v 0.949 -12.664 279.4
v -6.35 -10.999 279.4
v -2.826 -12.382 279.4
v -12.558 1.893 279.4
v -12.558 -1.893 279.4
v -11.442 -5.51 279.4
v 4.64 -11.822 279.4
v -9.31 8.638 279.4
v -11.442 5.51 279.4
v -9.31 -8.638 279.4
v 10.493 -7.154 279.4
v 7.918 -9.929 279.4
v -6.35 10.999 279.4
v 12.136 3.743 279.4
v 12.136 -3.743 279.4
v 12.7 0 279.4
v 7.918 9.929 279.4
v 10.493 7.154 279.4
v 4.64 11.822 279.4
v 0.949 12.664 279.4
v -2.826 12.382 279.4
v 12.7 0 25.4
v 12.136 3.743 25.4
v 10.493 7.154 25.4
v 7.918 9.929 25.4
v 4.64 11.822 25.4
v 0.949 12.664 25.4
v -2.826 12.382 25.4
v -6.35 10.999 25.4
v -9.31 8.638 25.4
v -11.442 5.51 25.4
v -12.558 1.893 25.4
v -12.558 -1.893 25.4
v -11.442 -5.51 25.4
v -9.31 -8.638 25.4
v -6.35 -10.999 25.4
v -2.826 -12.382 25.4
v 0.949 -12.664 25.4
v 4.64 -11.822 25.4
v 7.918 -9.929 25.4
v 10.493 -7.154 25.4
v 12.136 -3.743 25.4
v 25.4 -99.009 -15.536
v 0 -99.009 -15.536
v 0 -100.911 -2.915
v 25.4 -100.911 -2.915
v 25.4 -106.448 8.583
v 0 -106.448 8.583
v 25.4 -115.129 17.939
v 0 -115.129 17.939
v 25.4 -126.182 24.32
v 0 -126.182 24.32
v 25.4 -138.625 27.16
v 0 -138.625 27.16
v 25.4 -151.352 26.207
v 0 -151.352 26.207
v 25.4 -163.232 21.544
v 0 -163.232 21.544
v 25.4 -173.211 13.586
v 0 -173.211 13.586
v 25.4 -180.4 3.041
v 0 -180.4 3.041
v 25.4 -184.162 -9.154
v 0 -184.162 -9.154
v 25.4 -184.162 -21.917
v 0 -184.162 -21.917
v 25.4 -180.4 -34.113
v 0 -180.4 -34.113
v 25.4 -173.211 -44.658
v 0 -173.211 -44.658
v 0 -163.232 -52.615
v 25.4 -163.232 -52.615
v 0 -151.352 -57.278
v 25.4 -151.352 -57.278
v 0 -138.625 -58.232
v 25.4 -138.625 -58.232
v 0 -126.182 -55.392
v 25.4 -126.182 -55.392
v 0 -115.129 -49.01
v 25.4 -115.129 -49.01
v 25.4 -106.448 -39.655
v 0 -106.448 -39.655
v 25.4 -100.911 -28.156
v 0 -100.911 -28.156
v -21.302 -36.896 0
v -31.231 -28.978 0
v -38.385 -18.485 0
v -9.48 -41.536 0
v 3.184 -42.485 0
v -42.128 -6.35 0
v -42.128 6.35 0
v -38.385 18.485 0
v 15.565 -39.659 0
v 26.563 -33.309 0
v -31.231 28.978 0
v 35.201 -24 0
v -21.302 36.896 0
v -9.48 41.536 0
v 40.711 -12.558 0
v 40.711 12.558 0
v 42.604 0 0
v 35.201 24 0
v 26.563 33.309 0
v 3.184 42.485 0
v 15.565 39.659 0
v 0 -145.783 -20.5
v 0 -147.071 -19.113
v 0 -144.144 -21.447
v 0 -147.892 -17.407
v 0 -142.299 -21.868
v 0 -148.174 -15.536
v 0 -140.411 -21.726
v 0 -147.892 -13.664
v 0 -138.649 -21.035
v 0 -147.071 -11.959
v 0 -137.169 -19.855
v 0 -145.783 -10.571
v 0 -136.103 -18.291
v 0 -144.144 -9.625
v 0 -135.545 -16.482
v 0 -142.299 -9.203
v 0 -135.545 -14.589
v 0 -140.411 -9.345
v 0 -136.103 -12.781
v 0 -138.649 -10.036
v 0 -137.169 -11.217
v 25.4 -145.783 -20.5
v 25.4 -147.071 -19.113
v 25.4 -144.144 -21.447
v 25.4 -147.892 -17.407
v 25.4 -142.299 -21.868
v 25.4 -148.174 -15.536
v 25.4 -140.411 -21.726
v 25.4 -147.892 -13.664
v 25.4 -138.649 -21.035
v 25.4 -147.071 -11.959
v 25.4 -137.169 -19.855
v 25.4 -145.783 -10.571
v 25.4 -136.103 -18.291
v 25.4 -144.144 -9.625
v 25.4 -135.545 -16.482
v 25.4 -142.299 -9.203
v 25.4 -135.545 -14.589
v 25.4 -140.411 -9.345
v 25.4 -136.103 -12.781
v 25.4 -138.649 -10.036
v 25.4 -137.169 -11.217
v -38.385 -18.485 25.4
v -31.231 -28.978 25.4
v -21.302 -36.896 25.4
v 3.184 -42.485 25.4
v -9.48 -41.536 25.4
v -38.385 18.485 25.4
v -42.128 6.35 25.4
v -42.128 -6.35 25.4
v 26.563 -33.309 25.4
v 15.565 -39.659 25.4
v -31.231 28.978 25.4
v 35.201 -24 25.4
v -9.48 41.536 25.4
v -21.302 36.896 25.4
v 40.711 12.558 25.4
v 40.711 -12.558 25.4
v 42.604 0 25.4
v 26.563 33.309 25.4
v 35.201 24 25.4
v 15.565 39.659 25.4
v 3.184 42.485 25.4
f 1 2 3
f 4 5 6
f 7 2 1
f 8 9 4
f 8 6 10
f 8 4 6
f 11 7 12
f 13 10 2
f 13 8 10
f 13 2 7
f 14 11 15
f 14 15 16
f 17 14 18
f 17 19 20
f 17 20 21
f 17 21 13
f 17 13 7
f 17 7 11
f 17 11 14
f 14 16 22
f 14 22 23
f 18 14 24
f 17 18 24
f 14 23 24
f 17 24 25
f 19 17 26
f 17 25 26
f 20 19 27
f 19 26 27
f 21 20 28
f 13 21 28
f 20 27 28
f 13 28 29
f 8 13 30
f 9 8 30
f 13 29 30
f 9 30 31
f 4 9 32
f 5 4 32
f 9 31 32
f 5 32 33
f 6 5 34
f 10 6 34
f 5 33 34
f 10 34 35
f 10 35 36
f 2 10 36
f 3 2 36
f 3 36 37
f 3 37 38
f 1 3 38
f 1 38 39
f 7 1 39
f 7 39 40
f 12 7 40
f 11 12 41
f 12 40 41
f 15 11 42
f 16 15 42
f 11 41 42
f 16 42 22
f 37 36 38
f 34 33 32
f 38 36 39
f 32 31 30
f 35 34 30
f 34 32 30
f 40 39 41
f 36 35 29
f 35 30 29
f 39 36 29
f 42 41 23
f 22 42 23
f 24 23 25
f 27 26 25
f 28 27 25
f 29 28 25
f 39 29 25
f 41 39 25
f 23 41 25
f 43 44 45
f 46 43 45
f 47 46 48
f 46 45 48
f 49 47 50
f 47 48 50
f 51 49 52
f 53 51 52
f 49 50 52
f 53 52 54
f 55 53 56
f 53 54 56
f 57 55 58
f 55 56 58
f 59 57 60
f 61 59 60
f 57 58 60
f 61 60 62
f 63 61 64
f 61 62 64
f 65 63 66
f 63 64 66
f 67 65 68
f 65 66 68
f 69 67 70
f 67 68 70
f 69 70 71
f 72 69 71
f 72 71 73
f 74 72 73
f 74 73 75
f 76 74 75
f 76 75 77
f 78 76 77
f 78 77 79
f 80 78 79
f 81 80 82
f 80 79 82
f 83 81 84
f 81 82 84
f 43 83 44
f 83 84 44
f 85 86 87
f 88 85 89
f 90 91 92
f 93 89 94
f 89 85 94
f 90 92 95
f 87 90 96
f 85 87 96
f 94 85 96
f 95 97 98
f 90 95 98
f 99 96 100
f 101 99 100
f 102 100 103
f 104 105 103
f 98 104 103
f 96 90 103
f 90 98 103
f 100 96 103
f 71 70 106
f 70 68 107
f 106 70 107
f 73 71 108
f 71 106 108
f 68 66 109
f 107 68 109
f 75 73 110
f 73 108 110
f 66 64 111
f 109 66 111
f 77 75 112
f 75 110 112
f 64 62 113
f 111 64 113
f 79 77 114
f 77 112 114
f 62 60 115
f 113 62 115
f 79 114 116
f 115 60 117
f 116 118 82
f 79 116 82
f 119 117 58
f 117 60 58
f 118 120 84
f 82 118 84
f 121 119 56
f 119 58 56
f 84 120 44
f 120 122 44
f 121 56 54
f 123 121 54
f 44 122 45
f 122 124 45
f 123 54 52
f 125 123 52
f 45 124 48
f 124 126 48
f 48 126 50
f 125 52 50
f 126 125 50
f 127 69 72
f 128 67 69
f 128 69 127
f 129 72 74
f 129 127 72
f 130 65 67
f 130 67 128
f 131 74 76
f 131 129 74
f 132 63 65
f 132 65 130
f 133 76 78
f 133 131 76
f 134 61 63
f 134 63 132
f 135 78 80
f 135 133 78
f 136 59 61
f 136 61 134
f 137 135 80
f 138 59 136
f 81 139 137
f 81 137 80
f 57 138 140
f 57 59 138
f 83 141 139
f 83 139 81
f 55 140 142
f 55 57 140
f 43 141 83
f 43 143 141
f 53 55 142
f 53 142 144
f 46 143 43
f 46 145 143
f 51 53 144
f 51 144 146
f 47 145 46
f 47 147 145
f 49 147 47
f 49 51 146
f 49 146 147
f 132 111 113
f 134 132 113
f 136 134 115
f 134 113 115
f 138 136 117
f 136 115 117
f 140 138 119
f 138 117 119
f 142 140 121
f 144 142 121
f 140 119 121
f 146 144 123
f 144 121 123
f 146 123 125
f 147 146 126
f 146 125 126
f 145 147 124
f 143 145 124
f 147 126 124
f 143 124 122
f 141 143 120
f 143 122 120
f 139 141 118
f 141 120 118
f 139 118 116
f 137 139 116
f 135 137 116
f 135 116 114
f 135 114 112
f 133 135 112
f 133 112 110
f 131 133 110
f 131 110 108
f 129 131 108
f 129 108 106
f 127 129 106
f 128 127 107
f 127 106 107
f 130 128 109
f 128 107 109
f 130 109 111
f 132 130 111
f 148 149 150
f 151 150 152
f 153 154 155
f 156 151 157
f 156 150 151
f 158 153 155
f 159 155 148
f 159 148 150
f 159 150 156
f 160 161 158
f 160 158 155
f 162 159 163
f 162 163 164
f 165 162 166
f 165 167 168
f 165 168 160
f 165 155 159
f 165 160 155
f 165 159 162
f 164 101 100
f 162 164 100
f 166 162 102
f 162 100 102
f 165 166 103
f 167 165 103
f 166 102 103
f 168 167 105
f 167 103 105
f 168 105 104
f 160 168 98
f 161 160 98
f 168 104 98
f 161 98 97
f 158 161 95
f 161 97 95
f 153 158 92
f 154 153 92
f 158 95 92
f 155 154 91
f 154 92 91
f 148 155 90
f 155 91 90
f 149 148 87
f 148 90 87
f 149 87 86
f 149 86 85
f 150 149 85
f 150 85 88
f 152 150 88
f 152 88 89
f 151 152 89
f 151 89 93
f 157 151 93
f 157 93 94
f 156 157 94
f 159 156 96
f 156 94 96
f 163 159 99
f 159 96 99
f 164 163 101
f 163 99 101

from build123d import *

# Parameters (mm, degrees)
F0_R     = 42.6042021987
F1_DEPTH = 25.4
F2_R     = 42.8158000792
F3_DEPTH = 25.4
F4_R     = 12.7
F5_DEPTH = 254
F6_R     = 6.35
F7_DEPTH = 25.4


with BuildPart() as f1:
    # F0 (on Top) → F1 (new body)
    with BuildSketch(Plane.XY):
        Circle(F0_R)
    extrude(amount=F1_DEPTH)


with BuildPart() as f3:
    # F2 (on Right) → F3 (new body)
    with BuildSketch(Plane.YZ):
        with Locations((-141.8243199587, -15.5356675386)):
            Circle(F2_R)
    extrude(amount=F3_DEPTH)

    # F6 (on face) → F7 (cut)
    with BuildSketch(Plane(origin=(0, 0, 0), x_dir=(0, -1, 0), z_dir=(-1, 0, 0))):
        with Locations((141.8243199587, -15.5356675386)):
            Circle(F6_R)
    extrude(amount=-F7_DEPTH, mode=Mode.SUBTRACT)


with BuildPart() as f5:
    # F4 (on face) → F5 (new body)
    with BuildSketch(Plane.XY.offset(25.4)):
        Circle(F4_R)
    extrude(amount=F5_DEPTH)


solid = Compound([f1.part, f3.part, f5.part])
